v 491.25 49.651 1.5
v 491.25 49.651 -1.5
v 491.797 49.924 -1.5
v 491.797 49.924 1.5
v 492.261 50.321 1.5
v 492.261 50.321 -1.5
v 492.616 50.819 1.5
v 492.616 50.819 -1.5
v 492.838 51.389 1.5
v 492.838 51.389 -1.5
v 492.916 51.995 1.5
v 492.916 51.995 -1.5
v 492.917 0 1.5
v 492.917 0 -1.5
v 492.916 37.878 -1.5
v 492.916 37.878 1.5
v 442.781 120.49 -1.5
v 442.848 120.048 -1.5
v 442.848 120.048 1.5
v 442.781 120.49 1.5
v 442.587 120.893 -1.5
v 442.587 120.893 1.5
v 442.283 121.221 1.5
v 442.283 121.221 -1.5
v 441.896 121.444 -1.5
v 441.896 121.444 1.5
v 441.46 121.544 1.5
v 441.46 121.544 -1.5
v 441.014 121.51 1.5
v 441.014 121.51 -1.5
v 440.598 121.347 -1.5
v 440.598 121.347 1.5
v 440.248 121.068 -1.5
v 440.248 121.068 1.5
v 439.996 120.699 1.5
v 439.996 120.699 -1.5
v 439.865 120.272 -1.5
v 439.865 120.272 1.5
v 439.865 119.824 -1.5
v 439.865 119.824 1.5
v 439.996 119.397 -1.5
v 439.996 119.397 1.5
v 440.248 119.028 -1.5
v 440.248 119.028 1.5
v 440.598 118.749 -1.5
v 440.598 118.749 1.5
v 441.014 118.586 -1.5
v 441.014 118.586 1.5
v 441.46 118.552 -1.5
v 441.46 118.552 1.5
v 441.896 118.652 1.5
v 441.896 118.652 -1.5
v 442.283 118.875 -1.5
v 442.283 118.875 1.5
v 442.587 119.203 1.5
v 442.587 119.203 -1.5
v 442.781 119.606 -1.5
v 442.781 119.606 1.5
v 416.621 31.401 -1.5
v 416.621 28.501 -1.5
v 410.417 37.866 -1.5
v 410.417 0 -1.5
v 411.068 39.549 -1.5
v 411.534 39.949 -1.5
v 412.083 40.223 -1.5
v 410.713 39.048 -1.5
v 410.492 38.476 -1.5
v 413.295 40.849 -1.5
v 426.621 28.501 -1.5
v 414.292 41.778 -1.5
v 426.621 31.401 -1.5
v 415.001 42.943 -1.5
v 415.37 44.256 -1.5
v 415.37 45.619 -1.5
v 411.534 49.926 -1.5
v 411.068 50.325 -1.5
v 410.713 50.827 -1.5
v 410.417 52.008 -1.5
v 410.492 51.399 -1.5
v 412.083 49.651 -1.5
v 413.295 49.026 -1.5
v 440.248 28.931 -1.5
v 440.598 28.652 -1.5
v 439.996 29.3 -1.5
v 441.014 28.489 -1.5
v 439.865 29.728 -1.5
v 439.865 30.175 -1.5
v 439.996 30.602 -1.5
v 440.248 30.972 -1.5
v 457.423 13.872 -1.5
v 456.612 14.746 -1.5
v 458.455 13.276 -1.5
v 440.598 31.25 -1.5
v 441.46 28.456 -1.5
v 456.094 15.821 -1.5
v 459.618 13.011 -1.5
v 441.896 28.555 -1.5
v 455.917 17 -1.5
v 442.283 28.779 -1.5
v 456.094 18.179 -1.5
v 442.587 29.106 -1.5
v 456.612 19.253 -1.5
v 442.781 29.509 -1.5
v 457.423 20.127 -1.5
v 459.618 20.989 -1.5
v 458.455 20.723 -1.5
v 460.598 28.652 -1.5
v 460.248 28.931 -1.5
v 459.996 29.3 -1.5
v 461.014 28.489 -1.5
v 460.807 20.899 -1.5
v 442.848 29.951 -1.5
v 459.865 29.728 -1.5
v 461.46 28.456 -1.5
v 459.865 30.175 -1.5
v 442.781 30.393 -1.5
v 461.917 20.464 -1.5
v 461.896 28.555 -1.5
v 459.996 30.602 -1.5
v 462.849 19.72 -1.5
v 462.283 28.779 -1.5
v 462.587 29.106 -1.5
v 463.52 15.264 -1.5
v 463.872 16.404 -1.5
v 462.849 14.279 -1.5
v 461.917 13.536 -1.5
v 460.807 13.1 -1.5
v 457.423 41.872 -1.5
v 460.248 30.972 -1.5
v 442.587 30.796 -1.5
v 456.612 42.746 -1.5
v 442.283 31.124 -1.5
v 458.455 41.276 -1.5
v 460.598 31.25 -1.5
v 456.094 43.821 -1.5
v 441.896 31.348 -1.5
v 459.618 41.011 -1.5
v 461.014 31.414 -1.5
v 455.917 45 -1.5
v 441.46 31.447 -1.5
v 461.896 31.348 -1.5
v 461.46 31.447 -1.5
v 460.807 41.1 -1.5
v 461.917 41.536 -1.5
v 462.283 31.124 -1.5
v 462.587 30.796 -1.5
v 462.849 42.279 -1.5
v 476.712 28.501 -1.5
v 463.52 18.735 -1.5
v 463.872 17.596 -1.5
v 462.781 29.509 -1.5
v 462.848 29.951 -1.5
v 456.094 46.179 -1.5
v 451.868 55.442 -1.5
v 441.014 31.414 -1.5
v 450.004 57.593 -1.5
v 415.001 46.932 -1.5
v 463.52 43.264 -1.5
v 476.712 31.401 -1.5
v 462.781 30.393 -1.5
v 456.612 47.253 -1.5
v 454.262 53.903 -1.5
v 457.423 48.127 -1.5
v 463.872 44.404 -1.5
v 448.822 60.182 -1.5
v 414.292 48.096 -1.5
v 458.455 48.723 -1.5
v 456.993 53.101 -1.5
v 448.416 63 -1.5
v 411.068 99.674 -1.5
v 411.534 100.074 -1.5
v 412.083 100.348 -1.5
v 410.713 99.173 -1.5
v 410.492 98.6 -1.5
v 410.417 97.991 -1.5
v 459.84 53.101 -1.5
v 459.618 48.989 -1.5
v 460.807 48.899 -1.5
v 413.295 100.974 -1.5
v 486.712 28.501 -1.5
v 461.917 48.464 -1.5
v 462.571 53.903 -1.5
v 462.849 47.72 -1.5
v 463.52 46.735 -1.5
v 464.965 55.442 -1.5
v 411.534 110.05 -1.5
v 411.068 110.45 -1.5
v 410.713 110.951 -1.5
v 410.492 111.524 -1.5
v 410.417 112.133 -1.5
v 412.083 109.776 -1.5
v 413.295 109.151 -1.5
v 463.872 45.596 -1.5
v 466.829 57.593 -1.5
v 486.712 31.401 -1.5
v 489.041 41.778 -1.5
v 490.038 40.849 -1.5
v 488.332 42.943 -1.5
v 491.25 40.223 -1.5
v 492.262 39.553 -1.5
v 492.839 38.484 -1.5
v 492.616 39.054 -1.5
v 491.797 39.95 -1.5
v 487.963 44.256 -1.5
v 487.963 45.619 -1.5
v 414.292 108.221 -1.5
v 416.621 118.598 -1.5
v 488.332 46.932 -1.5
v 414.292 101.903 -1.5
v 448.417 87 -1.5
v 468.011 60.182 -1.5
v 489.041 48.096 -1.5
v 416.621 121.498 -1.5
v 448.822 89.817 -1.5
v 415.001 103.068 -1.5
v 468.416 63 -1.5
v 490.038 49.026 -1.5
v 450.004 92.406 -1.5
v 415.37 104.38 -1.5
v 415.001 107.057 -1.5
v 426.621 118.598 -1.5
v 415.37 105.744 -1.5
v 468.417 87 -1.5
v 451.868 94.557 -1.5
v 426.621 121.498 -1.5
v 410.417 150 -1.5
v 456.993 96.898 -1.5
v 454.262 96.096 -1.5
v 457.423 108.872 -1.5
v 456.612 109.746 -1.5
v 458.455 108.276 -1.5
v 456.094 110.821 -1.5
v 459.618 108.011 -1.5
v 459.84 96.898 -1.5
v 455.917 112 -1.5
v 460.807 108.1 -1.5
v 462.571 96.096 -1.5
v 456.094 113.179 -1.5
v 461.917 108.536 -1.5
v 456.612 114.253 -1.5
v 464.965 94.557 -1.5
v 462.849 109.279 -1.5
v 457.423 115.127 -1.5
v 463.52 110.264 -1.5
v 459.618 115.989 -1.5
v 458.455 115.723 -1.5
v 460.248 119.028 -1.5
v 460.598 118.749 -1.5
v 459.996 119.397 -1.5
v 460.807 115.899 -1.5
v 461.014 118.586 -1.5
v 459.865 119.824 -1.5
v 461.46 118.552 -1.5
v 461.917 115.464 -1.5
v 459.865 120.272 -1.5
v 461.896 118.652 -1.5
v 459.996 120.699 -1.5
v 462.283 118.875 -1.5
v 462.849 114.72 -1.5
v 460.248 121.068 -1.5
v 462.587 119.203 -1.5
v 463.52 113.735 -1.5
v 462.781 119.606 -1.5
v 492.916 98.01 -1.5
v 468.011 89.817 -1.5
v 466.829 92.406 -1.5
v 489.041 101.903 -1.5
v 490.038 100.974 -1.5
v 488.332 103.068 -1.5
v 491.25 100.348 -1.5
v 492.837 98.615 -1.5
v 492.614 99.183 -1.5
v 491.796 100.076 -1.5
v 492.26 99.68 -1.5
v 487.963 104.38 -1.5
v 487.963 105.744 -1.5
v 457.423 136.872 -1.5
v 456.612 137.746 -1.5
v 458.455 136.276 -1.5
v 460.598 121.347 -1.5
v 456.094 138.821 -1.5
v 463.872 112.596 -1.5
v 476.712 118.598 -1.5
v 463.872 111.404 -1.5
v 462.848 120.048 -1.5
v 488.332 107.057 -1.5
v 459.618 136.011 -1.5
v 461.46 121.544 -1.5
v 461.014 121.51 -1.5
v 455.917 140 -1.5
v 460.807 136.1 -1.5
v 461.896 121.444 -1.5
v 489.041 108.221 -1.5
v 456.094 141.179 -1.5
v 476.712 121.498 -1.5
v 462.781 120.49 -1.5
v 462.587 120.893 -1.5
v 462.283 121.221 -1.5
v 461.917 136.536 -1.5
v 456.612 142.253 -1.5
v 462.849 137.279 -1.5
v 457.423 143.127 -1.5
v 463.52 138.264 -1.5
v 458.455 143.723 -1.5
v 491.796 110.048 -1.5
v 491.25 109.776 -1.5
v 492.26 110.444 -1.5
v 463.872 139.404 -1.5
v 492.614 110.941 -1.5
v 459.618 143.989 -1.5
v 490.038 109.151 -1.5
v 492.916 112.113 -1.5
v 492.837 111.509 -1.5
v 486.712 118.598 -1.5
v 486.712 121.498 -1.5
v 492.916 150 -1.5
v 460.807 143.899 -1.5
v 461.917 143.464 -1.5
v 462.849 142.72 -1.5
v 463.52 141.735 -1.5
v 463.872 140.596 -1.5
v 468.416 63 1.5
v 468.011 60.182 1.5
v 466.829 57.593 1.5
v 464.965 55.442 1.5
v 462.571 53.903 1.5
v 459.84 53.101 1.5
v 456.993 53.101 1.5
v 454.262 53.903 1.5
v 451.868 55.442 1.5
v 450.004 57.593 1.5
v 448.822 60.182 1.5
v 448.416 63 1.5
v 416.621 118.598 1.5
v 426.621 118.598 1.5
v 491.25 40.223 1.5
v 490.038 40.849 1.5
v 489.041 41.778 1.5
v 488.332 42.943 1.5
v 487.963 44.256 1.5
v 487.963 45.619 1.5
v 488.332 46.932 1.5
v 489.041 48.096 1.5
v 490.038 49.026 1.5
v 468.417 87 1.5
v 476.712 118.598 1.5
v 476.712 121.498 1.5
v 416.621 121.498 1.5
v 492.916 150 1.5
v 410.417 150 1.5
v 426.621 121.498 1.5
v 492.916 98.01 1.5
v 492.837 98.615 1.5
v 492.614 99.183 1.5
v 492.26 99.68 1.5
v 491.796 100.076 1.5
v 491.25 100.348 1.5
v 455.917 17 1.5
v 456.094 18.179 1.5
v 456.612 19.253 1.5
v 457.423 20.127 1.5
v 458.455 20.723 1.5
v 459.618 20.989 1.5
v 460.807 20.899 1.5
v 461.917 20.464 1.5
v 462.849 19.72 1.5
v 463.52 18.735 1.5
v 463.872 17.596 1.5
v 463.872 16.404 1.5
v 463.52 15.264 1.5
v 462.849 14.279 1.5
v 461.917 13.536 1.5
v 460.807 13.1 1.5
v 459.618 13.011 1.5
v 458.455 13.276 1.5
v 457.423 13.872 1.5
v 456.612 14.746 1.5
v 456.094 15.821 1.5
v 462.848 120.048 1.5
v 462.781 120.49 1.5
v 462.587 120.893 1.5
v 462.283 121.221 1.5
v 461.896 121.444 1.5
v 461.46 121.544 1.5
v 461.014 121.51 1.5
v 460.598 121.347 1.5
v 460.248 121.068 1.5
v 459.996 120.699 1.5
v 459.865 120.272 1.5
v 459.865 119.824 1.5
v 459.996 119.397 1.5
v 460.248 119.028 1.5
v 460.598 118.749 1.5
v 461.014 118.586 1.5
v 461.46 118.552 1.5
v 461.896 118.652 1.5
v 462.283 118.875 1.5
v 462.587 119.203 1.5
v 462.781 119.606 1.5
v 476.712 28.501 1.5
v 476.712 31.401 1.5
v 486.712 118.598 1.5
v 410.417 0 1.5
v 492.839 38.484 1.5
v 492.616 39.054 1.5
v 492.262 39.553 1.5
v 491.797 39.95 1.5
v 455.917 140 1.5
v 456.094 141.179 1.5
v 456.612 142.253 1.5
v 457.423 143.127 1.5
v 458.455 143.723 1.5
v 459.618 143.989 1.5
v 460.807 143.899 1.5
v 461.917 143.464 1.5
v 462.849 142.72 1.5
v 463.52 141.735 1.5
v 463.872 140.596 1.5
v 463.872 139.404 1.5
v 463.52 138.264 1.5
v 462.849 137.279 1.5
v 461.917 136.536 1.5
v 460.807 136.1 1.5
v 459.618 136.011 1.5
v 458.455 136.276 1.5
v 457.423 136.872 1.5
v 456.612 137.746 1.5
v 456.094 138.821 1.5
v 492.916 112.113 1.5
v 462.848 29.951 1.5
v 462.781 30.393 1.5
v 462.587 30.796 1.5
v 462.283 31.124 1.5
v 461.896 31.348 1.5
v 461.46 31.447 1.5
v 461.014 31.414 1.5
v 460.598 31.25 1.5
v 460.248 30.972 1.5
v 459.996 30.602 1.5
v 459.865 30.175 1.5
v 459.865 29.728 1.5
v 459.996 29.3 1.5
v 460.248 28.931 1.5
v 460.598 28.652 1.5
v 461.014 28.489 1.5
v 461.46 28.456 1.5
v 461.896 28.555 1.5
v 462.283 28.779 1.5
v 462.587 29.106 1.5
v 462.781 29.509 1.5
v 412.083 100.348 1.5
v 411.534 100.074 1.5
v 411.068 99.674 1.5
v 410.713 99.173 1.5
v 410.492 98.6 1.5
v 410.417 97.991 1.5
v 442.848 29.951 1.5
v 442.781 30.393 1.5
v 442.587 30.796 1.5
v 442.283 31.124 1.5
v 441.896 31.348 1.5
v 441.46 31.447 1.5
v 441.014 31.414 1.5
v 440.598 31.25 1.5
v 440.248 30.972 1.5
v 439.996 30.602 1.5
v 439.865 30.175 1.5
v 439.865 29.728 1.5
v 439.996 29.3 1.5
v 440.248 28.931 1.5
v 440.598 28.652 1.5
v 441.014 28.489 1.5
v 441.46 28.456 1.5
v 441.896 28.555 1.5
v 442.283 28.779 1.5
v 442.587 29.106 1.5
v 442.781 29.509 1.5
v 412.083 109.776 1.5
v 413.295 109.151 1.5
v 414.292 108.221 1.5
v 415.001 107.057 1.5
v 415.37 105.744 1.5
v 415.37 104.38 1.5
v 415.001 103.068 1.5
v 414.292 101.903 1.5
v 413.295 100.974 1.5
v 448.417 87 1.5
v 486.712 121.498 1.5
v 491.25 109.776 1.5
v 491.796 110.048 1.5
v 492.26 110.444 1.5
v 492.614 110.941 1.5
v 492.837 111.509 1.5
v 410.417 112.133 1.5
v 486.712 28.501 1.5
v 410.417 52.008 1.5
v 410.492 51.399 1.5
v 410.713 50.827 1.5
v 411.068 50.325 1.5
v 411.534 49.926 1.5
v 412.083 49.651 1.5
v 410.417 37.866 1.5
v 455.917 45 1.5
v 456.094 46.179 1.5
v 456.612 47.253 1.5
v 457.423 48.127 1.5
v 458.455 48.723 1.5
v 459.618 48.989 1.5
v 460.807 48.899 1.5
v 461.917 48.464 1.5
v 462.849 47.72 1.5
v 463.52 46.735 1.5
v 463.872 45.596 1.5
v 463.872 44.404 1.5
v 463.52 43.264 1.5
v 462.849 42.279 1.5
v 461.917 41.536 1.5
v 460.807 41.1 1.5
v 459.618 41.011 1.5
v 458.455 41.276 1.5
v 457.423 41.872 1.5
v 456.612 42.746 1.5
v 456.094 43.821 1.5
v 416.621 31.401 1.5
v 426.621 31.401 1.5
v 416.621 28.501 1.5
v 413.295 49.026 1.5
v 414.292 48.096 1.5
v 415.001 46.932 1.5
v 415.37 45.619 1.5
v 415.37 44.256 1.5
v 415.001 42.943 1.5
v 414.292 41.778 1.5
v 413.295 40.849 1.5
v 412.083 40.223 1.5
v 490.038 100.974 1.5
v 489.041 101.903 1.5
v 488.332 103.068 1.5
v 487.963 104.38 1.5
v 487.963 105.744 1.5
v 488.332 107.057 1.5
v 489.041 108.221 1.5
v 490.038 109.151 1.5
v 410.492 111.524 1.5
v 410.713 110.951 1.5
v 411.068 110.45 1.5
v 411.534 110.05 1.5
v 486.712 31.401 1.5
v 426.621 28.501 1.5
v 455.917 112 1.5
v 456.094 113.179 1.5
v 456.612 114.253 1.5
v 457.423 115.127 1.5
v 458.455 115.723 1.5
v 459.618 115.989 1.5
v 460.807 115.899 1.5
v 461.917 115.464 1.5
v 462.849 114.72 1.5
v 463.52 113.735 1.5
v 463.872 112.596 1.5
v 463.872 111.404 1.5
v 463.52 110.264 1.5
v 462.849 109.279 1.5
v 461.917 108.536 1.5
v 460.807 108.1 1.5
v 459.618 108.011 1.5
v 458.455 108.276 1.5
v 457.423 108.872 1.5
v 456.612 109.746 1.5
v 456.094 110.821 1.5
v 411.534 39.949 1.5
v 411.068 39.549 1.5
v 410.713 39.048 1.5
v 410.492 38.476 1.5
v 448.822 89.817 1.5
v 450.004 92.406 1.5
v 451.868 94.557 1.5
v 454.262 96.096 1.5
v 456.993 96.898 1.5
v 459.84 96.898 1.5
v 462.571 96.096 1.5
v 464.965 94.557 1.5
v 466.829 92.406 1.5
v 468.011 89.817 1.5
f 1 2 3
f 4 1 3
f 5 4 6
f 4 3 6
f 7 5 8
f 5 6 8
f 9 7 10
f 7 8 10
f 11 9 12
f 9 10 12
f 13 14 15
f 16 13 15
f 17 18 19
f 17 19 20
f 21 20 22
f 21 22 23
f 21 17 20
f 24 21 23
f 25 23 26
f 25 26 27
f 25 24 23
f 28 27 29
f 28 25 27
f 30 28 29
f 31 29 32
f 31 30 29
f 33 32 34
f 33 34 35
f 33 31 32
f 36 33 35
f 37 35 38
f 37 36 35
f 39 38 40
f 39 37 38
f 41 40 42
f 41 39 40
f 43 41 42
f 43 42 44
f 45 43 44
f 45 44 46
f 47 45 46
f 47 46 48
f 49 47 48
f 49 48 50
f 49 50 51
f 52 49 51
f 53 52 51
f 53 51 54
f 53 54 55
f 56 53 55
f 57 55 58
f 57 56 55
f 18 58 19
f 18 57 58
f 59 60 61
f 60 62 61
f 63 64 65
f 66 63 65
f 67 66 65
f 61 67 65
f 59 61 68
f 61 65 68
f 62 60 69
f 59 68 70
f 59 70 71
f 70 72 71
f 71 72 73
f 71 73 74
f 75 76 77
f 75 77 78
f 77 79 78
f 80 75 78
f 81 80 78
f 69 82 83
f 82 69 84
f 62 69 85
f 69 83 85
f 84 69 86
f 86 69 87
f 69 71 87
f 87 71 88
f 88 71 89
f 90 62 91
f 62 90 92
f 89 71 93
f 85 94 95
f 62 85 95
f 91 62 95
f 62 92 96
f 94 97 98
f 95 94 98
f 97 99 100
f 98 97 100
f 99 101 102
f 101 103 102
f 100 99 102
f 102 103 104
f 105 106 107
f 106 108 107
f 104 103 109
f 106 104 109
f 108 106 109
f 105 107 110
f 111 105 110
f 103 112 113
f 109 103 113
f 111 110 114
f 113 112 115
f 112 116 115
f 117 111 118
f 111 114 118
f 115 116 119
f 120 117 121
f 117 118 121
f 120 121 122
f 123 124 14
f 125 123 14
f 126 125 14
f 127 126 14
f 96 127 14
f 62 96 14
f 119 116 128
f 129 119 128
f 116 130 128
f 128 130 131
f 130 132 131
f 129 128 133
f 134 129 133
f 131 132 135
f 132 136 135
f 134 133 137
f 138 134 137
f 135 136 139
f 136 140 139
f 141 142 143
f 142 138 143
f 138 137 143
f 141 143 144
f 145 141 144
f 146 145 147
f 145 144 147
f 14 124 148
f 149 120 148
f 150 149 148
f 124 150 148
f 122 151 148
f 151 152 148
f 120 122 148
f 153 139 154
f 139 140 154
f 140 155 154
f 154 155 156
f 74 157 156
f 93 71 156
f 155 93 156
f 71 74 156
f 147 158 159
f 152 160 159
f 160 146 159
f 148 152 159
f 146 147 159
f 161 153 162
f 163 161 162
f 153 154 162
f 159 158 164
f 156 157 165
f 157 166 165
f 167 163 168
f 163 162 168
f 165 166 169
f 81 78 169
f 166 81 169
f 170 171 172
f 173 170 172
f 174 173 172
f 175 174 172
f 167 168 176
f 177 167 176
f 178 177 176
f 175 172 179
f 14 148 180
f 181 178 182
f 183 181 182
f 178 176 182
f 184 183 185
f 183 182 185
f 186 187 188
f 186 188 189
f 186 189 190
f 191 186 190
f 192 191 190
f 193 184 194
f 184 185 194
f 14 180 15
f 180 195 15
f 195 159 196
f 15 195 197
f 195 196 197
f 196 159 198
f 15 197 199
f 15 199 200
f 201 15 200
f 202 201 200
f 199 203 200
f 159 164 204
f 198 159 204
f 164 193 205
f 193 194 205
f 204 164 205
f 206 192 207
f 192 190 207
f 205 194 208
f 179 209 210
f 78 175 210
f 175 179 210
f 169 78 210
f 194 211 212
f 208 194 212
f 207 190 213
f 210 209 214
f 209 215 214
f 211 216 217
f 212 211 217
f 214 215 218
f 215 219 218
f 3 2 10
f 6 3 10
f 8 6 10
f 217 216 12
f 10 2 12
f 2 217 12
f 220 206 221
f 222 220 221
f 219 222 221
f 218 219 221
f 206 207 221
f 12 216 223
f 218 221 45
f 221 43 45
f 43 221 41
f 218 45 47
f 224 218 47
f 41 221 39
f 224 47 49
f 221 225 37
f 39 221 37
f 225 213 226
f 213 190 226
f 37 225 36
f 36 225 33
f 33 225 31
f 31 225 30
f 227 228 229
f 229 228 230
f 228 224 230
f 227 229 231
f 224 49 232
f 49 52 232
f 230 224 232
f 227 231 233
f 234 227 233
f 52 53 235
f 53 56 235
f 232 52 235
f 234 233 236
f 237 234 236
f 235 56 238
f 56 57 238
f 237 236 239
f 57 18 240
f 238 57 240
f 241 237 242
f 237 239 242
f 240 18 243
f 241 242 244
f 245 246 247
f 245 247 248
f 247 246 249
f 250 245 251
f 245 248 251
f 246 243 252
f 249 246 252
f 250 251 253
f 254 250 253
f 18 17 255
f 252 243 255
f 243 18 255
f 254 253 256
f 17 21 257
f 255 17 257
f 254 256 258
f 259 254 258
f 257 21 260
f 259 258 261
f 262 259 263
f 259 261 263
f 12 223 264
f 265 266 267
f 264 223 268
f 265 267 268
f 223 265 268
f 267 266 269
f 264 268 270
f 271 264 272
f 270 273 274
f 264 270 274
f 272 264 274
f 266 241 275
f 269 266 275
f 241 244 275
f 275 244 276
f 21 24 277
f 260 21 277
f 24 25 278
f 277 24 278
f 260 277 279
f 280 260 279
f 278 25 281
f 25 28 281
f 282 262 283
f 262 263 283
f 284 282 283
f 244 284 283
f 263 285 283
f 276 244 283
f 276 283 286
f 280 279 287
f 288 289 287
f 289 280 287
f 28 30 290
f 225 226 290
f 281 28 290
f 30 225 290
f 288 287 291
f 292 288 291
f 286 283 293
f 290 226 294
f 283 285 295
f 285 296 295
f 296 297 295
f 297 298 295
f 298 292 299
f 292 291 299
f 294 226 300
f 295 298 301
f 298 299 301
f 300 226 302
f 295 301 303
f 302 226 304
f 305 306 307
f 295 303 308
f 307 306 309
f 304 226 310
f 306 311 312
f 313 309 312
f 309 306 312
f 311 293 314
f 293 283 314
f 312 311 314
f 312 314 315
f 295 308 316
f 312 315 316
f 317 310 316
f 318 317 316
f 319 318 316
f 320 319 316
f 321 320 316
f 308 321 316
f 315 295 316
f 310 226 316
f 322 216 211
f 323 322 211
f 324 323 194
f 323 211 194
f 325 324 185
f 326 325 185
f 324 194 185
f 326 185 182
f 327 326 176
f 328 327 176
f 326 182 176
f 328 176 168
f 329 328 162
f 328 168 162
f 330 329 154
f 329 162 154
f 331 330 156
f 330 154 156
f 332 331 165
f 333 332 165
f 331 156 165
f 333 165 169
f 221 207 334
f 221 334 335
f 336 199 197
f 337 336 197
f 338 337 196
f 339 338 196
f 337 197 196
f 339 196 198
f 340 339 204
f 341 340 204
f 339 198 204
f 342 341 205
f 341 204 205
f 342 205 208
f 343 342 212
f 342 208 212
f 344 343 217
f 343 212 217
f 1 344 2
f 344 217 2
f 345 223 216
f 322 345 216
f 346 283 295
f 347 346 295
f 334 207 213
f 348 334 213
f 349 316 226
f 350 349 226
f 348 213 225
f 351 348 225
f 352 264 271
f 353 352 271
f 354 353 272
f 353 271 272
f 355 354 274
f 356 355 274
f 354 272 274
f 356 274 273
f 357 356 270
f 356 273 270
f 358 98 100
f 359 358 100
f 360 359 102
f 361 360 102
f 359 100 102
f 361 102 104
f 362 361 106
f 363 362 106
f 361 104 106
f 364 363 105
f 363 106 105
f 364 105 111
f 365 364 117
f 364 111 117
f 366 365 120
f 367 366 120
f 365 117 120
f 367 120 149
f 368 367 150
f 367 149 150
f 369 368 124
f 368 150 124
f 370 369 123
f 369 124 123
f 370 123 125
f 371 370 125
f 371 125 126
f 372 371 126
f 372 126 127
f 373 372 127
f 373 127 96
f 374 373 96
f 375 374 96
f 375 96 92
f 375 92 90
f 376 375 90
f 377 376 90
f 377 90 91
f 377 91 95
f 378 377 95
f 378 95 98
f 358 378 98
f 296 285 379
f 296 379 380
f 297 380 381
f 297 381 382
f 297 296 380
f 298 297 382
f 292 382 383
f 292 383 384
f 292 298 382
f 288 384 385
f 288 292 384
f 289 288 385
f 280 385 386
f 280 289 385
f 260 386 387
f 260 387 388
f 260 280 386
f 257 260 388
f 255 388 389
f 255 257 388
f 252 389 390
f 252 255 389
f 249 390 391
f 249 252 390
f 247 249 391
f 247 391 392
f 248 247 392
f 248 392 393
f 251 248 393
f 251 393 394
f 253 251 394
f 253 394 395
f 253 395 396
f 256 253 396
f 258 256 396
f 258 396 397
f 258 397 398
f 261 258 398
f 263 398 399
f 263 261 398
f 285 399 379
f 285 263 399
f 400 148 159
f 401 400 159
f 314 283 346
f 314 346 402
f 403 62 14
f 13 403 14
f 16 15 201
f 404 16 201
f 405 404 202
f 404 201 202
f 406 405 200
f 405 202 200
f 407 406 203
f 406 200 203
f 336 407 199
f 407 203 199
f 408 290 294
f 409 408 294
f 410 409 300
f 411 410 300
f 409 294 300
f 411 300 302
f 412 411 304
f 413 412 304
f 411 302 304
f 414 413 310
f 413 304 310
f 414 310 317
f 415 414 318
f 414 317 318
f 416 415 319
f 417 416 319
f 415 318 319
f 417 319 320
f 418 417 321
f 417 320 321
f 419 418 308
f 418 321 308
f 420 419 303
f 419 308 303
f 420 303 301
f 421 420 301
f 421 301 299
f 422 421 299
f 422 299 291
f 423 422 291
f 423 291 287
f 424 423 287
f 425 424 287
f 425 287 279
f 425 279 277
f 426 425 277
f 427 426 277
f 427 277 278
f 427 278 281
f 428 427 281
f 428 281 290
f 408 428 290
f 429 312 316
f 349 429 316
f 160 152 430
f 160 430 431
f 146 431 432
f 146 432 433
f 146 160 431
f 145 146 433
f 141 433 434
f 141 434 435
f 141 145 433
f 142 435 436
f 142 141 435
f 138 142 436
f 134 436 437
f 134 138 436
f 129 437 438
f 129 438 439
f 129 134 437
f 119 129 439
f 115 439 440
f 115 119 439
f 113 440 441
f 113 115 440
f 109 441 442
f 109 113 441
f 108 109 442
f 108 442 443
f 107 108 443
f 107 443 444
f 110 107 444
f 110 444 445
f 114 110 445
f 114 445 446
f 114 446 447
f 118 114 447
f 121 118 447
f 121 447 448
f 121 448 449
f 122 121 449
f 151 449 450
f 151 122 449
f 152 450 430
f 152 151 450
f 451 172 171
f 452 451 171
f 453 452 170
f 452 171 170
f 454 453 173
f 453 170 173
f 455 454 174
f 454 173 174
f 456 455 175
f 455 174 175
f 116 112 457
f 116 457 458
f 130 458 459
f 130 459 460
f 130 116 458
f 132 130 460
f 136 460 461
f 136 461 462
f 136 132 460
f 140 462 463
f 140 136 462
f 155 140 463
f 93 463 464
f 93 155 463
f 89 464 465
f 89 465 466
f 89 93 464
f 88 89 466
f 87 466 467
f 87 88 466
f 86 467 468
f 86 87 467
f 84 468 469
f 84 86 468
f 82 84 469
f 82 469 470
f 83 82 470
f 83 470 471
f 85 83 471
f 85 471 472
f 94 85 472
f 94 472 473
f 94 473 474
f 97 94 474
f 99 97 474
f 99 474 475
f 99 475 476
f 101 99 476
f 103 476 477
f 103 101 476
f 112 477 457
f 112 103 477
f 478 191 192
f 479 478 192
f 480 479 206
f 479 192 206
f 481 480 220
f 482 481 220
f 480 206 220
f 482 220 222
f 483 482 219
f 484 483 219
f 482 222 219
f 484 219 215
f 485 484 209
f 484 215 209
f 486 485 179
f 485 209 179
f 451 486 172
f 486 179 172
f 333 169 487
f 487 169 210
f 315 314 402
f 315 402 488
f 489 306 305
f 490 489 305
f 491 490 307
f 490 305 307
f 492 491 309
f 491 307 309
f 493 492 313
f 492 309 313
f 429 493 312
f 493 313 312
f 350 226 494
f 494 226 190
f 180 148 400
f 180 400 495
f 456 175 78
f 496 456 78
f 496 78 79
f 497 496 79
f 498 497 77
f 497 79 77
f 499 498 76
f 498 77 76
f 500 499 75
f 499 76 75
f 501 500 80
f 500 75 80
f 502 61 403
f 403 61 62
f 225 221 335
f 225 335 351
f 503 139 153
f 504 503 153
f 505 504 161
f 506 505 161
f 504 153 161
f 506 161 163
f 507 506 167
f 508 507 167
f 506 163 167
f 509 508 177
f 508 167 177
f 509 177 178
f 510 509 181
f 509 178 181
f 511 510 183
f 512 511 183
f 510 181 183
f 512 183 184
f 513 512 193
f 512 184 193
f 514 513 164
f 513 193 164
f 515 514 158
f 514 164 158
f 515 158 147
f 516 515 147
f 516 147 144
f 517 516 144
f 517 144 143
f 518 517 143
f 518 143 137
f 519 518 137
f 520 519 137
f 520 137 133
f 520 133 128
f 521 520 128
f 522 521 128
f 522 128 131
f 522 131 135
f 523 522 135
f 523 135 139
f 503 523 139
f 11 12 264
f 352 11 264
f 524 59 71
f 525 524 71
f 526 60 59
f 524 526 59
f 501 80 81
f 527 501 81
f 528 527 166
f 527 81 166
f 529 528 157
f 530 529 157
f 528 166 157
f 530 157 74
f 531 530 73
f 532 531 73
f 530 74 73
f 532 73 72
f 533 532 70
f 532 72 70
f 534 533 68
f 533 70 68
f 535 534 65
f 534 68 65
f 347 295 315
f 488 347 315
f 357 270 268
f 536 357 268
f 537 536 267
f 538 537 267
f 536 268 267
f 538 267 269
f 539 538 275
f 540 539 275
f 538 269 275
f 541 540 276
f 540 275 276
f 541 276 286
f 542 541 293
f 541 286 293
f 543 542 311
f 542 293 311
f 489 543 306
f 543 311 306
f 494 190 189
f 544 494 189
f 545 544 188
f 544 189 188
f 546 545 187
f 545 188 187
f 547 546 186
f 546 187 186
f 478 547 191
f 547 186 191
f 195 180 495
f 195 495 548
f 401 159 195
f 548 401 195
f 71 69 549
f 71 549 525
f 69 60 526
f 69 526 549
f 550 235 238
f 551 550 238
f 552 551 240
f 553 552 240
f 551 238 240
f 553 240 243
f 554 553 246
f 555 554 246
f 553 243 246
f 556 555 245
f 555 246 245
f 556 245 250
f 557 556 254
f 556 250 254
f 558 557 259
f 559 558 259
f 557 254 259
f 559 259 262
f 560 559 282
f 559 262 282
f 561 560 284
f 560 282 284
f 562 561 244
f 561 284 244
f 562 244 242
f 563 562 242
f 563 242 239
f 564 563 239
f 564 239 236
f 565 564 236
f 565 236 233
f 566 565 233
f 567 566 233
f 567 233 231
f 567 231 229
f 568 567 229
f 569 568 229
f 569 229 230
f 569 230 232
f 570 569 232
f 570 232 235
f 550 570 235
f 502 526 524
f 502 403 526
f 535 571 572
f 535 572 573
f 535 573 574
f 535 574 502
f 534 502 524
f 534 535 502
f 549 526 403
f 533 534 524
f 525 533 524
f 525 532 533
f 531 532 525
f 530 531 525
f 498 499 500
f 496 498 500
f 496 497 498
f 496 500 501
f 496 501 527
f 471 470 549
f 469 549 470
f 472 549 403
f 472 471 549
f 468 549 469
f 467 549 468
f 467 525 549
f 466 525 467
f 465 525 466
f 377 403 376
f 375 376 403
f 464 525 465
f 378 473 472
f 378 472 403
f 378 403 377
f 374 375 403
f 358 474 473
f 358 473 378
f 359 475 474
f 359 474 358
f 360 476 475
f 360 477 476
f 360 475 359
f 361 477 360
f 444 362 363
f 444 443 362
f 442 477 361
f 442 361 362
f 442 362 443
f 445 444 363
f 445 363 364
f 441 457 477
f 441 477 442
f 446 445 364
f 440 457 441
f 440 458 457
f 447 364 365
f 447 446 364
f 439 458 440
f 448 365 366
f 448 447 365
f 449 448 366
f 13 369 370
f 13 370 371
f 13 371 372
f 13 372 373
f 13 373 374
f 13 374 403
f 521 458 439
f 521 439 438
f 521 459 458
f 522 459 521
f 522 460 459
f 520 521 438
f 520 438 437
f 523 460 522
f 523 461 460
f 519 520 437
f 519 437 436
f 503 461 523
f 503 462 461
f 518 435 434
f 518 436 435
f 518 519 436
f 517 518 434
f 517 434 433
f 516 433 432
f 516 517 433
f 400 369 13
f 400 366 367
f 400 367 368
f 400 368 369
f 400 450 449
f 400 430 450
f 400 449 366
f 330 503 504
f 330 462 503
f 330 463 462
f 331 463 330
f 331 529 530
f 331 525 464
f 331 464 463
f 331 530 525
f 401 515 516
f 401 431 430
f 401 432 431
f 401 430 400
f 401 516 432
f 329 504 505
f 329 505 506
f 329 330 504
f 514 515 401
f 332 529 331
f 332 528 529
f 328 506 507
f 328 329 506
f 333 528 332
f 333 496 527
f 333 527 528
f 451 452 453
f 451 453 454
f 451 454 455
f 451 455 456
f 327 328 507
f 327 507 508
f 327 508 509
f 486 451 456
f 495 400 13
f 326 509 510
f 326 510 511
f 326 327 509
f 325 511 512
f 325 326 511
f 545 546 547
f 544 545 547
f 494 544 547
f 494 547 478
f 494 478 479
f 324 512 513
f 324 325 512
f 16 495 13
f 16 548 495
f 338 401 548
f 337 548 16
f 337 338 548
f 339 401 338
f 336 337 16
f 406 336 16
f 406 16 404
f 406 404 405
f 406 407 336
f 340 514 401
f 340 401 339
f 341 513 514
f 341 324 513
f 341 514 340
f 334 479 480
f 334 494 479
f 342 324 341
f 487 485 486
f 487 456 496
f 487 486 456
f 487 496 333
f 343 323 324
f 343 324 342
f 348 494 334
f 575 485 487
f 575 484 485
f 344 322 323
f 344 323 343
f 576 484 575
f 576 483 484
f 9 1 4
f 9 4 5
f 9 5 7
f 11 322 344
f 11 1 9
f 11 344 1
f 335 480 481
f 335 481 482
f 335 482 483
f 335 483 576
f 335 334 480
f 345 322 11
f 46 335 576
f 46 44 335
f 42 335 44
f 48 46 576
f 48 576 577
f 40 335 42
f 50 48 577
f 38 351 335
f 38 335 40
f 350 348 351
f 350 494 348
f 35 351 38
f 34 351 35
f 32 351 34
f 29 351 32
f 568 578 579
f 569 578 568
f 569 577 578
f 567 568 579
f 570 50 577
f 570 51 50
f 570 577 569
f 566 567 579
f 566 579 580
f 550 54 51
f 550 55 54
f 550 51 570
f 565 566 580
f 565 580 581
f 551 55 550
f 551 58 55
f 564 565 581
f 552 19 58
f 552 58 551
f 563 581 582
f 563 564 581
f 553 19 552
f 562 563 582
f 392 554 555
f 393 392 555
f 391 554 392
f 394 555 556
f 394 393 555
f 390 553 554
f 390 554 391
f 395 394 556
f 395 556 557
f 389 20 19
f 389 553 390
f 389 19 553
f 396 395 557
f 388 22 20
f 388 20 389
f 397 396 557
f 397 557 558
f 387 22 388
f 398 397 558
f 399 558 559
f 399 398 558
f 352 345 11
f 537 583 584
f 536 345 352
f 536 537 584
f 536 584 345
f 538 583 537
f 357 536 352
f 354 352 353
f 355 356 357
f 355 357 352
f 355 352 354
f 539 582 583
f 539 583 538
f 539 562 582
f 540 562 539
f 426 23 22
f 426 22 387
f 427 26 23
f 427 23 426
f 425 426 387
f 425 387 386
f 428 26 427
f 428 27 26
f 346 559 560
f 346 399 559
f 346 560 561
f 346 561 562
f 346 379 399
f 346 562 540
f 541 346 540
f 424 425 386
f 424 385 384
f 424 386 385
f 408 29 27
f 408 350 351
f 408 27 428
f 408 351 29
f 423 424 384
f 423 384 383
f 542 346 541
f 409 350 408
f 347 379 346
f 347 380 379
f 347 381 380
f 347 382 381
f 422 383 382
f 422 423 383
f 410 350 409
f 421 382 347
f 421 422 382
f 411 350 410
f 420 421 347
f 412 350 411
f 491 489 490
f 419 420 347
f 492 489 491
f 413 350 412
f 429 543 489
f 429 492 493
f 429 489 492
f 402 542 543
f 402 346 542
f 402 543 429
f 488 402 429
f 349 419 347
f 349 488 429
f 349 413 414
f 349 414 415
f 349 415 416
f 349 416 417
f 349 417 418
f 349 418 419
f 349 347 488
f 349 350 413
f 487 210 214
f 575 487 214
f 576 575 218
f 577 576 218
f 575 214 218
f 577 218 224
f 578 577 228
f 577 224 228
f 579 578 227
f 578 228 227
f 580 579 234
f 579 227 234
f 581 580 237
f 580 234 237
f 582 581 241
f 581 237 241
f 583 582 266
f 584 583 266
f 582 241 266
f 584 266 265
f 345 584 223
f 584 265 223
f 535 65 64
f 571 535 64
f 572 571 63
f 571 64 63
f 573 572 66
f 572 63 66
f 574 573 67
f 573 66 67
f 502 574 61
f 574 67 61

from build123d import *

# Parameters (mm, degrees)
SALIENTE_EXTRUIR1_START     = -1.5
SALIENTE_EXTRUIR1_OUTLINE_W = 10
SALIENTE_EXTRUIR1_OUTLINE_H = 2.9
SALIENTE_EXTRUIR1_OUTLINE_R = 1.5
SALIENTE_EXTRUIR1_DEPTH     = 3
CROQUIS2_R                  = 4
CORTAR_EXTRUIR1_DEPTH       = 10


# Read off the part's stored shape, not the designer's step: Saliente-Extruir1
with BuildPart() as part:
    # Saliente-Extruir1 outline → Saliente-Extruir1 (new body)
    with BuildSketch(Plane.XY.offset(SALIENTE_EXTRUIR1_START)):
        with BuildLine():
            ThreePointArc((492.916449572, 98.009593947), (492.452410006, 99.442022929), (491.249851225, 100.348134338))
            ThreePointArc((491.249851225, 100.348134338), (487.916517891, 105.062179546), (491.249851225, 109.776224754))
            ThreePointArc((491.249851225, 109.776224754), (492.452037009, 110.681812922), (492.916439741, 112.113480025))
            Line((492.916439741, 112.113480025), (492.916413331, 149.999679341))
            Line((492.916413331, 149.999679341), (410.416517891, 149.999679341))
            Line((410.416517891, 149.999679341), (410.416517891, 112.133247358))
            ThreePointArc((410.416517891, 112.133247358), (410.875276439, 110.689871685), (412.083184558, 109.776224754))
            ThreePointArc((412.083184558, 109.776224754), (415.416517891, 105.062179546), (412.083184558, 100.348134338))
            ThreePointArc((412.083184558, 100.348134338), (410.875276439, 99.434487407), (410.416517891, 97.991111734))
            Line((410.416517891, 97.991111734), (410.416517891, 52.008362374))
            ThreePointArc((410.416517891, 52.008362374), (410.875276439, 50.564986701), (412.083184558, 49.65133977))
            ThreePointArc((412.083184558, 49.65133977), (415.416517891, 44.937294562), (412.083184558, 40.223249354))
            ThreePointArc((412.083184558, 40.223249354), (410.875276439, 39.309602423), (410.416517891, 37.86622675))
            Line((410.416517891, 37.86622675), (410.416517891, -0.000320659))
            Line((410.416517891, -0.000320659), (492.916517891, -0.000320659))
            Line((492.916517891, -0.000320659), (492.916491488, 37.877716604))
            ThreePointArc((492.916491488, 37.877716604), (492.45443711, 39.314289338), (491.249851225, 40.223249354))
            ThreePointArc((491.249851225, 40.223249354), (487.916517891, 44.937294562), (491.249851225, 49.65133977))
            ThreePointArc((491.249851225, 49.65133977), (492.453865854, 50.559496169), (492.916481647, 51.994900607))
            Line((492.916481647, 51.994900607), (492.916449572, 98.009593947))
        make_face()
        with Locations((421.620579276, 29.951315893)):
            Rectangle(SALIENTE_EXTRUIR1_OUTLINE_W, SALIENTE_EXTRUIR1_OUTLINE_H, mode=Mode.SUBTRACT)
        with Locations((441.347923427, 29.951315893)):
            Circle(SALIENTE_EXTRUIR1_OUTLINE_R, mode=Mode.SUBTRACT)
        with Locations((461.347923427, 29.951315893)):
            Circle(SALIENTE_EXTRUIR1_OUTLINE_R, mode=Mode.SUBTRACT)
        with Locations((481.712351947, 29.951315893)):
            Rectangle(SALIENTE_EXTRUIR1_OUTLINE_W, SALIENTE_EXTRUIR1_OUTLINE_H, mode=Mode.SUBTRACT)
        with Locations((421.620579275, 120.047994692)):
            Rectangle(SALIENTE_EXTRUIR1_OUTLINE_W, SALIENTE_EXTRUIR1_OUTLINE_H, mode=Mode.SUBTRACT)
        with Locations((441.347923427, 120.047994692)):
            Circle(SALIENTE_EXTRUIR1_OUTLINE_R, mode=Mode.SUBTRACT)
        with BuildLine():
            ThreePointArc((448.416504048, 86.999703476), (458.416504048, 96.999703476), (468.416504048, 86.999703476))
            Line((468.416504048, 86.999703476), (468.416487259, 62.999703476))
            ThreePointArc((468.416487259, 62.999703476), (458.416483767, 52.999703476), (448.416487259, 62.999710459))
            Line((448.416487259, 62.999710459), (448.416504048, 86.999703476))
        make_face(mode=Mode.SUBTRACT)
        with Locations((461.347923427, 120.047994692)):
            Circle(SALIENTE_EXTRUIR1_OUTLINE_R, mode=Mode.SUBTRACT)
        with Locations((481.712351947, 120.047994692)):
            Rectangle(SALIENTE_EXTRUIR1_OUTLINE_W, SALIENTE_EXTRUIR1_OUTLINE_H, mode=Mode.SUBTRACT)
    extrude(amount=SALIENTE_EXTRUIR1_DEPTH)

    # Croquis2 → Cortar-Extruir1 (cut)
    with BuildSketch(Plane(origin=(0, 0, -1.5), x_dir=(-1, 0, 0), z_dir=(0, 0, -1))):
        with Locations((-459.916517891, 16.999737054)):
            Circle(CROQUIS2_R)
        with Locations((-459.916517891, 44.999737054)):
            Circle(CROQUIS2_R)
        with Locations((-459.916517891, 111.999737054)):
            Circle(CROQUIS2_R)
        with Locations((-459.916517891, 139.999737054)):
            Circle(CROQUIS2_R)
    extrude(amount=-CORTAR_EXTRUIR1_DEPTH, mode=Mode.SUBTRACT)


solid = part.part
